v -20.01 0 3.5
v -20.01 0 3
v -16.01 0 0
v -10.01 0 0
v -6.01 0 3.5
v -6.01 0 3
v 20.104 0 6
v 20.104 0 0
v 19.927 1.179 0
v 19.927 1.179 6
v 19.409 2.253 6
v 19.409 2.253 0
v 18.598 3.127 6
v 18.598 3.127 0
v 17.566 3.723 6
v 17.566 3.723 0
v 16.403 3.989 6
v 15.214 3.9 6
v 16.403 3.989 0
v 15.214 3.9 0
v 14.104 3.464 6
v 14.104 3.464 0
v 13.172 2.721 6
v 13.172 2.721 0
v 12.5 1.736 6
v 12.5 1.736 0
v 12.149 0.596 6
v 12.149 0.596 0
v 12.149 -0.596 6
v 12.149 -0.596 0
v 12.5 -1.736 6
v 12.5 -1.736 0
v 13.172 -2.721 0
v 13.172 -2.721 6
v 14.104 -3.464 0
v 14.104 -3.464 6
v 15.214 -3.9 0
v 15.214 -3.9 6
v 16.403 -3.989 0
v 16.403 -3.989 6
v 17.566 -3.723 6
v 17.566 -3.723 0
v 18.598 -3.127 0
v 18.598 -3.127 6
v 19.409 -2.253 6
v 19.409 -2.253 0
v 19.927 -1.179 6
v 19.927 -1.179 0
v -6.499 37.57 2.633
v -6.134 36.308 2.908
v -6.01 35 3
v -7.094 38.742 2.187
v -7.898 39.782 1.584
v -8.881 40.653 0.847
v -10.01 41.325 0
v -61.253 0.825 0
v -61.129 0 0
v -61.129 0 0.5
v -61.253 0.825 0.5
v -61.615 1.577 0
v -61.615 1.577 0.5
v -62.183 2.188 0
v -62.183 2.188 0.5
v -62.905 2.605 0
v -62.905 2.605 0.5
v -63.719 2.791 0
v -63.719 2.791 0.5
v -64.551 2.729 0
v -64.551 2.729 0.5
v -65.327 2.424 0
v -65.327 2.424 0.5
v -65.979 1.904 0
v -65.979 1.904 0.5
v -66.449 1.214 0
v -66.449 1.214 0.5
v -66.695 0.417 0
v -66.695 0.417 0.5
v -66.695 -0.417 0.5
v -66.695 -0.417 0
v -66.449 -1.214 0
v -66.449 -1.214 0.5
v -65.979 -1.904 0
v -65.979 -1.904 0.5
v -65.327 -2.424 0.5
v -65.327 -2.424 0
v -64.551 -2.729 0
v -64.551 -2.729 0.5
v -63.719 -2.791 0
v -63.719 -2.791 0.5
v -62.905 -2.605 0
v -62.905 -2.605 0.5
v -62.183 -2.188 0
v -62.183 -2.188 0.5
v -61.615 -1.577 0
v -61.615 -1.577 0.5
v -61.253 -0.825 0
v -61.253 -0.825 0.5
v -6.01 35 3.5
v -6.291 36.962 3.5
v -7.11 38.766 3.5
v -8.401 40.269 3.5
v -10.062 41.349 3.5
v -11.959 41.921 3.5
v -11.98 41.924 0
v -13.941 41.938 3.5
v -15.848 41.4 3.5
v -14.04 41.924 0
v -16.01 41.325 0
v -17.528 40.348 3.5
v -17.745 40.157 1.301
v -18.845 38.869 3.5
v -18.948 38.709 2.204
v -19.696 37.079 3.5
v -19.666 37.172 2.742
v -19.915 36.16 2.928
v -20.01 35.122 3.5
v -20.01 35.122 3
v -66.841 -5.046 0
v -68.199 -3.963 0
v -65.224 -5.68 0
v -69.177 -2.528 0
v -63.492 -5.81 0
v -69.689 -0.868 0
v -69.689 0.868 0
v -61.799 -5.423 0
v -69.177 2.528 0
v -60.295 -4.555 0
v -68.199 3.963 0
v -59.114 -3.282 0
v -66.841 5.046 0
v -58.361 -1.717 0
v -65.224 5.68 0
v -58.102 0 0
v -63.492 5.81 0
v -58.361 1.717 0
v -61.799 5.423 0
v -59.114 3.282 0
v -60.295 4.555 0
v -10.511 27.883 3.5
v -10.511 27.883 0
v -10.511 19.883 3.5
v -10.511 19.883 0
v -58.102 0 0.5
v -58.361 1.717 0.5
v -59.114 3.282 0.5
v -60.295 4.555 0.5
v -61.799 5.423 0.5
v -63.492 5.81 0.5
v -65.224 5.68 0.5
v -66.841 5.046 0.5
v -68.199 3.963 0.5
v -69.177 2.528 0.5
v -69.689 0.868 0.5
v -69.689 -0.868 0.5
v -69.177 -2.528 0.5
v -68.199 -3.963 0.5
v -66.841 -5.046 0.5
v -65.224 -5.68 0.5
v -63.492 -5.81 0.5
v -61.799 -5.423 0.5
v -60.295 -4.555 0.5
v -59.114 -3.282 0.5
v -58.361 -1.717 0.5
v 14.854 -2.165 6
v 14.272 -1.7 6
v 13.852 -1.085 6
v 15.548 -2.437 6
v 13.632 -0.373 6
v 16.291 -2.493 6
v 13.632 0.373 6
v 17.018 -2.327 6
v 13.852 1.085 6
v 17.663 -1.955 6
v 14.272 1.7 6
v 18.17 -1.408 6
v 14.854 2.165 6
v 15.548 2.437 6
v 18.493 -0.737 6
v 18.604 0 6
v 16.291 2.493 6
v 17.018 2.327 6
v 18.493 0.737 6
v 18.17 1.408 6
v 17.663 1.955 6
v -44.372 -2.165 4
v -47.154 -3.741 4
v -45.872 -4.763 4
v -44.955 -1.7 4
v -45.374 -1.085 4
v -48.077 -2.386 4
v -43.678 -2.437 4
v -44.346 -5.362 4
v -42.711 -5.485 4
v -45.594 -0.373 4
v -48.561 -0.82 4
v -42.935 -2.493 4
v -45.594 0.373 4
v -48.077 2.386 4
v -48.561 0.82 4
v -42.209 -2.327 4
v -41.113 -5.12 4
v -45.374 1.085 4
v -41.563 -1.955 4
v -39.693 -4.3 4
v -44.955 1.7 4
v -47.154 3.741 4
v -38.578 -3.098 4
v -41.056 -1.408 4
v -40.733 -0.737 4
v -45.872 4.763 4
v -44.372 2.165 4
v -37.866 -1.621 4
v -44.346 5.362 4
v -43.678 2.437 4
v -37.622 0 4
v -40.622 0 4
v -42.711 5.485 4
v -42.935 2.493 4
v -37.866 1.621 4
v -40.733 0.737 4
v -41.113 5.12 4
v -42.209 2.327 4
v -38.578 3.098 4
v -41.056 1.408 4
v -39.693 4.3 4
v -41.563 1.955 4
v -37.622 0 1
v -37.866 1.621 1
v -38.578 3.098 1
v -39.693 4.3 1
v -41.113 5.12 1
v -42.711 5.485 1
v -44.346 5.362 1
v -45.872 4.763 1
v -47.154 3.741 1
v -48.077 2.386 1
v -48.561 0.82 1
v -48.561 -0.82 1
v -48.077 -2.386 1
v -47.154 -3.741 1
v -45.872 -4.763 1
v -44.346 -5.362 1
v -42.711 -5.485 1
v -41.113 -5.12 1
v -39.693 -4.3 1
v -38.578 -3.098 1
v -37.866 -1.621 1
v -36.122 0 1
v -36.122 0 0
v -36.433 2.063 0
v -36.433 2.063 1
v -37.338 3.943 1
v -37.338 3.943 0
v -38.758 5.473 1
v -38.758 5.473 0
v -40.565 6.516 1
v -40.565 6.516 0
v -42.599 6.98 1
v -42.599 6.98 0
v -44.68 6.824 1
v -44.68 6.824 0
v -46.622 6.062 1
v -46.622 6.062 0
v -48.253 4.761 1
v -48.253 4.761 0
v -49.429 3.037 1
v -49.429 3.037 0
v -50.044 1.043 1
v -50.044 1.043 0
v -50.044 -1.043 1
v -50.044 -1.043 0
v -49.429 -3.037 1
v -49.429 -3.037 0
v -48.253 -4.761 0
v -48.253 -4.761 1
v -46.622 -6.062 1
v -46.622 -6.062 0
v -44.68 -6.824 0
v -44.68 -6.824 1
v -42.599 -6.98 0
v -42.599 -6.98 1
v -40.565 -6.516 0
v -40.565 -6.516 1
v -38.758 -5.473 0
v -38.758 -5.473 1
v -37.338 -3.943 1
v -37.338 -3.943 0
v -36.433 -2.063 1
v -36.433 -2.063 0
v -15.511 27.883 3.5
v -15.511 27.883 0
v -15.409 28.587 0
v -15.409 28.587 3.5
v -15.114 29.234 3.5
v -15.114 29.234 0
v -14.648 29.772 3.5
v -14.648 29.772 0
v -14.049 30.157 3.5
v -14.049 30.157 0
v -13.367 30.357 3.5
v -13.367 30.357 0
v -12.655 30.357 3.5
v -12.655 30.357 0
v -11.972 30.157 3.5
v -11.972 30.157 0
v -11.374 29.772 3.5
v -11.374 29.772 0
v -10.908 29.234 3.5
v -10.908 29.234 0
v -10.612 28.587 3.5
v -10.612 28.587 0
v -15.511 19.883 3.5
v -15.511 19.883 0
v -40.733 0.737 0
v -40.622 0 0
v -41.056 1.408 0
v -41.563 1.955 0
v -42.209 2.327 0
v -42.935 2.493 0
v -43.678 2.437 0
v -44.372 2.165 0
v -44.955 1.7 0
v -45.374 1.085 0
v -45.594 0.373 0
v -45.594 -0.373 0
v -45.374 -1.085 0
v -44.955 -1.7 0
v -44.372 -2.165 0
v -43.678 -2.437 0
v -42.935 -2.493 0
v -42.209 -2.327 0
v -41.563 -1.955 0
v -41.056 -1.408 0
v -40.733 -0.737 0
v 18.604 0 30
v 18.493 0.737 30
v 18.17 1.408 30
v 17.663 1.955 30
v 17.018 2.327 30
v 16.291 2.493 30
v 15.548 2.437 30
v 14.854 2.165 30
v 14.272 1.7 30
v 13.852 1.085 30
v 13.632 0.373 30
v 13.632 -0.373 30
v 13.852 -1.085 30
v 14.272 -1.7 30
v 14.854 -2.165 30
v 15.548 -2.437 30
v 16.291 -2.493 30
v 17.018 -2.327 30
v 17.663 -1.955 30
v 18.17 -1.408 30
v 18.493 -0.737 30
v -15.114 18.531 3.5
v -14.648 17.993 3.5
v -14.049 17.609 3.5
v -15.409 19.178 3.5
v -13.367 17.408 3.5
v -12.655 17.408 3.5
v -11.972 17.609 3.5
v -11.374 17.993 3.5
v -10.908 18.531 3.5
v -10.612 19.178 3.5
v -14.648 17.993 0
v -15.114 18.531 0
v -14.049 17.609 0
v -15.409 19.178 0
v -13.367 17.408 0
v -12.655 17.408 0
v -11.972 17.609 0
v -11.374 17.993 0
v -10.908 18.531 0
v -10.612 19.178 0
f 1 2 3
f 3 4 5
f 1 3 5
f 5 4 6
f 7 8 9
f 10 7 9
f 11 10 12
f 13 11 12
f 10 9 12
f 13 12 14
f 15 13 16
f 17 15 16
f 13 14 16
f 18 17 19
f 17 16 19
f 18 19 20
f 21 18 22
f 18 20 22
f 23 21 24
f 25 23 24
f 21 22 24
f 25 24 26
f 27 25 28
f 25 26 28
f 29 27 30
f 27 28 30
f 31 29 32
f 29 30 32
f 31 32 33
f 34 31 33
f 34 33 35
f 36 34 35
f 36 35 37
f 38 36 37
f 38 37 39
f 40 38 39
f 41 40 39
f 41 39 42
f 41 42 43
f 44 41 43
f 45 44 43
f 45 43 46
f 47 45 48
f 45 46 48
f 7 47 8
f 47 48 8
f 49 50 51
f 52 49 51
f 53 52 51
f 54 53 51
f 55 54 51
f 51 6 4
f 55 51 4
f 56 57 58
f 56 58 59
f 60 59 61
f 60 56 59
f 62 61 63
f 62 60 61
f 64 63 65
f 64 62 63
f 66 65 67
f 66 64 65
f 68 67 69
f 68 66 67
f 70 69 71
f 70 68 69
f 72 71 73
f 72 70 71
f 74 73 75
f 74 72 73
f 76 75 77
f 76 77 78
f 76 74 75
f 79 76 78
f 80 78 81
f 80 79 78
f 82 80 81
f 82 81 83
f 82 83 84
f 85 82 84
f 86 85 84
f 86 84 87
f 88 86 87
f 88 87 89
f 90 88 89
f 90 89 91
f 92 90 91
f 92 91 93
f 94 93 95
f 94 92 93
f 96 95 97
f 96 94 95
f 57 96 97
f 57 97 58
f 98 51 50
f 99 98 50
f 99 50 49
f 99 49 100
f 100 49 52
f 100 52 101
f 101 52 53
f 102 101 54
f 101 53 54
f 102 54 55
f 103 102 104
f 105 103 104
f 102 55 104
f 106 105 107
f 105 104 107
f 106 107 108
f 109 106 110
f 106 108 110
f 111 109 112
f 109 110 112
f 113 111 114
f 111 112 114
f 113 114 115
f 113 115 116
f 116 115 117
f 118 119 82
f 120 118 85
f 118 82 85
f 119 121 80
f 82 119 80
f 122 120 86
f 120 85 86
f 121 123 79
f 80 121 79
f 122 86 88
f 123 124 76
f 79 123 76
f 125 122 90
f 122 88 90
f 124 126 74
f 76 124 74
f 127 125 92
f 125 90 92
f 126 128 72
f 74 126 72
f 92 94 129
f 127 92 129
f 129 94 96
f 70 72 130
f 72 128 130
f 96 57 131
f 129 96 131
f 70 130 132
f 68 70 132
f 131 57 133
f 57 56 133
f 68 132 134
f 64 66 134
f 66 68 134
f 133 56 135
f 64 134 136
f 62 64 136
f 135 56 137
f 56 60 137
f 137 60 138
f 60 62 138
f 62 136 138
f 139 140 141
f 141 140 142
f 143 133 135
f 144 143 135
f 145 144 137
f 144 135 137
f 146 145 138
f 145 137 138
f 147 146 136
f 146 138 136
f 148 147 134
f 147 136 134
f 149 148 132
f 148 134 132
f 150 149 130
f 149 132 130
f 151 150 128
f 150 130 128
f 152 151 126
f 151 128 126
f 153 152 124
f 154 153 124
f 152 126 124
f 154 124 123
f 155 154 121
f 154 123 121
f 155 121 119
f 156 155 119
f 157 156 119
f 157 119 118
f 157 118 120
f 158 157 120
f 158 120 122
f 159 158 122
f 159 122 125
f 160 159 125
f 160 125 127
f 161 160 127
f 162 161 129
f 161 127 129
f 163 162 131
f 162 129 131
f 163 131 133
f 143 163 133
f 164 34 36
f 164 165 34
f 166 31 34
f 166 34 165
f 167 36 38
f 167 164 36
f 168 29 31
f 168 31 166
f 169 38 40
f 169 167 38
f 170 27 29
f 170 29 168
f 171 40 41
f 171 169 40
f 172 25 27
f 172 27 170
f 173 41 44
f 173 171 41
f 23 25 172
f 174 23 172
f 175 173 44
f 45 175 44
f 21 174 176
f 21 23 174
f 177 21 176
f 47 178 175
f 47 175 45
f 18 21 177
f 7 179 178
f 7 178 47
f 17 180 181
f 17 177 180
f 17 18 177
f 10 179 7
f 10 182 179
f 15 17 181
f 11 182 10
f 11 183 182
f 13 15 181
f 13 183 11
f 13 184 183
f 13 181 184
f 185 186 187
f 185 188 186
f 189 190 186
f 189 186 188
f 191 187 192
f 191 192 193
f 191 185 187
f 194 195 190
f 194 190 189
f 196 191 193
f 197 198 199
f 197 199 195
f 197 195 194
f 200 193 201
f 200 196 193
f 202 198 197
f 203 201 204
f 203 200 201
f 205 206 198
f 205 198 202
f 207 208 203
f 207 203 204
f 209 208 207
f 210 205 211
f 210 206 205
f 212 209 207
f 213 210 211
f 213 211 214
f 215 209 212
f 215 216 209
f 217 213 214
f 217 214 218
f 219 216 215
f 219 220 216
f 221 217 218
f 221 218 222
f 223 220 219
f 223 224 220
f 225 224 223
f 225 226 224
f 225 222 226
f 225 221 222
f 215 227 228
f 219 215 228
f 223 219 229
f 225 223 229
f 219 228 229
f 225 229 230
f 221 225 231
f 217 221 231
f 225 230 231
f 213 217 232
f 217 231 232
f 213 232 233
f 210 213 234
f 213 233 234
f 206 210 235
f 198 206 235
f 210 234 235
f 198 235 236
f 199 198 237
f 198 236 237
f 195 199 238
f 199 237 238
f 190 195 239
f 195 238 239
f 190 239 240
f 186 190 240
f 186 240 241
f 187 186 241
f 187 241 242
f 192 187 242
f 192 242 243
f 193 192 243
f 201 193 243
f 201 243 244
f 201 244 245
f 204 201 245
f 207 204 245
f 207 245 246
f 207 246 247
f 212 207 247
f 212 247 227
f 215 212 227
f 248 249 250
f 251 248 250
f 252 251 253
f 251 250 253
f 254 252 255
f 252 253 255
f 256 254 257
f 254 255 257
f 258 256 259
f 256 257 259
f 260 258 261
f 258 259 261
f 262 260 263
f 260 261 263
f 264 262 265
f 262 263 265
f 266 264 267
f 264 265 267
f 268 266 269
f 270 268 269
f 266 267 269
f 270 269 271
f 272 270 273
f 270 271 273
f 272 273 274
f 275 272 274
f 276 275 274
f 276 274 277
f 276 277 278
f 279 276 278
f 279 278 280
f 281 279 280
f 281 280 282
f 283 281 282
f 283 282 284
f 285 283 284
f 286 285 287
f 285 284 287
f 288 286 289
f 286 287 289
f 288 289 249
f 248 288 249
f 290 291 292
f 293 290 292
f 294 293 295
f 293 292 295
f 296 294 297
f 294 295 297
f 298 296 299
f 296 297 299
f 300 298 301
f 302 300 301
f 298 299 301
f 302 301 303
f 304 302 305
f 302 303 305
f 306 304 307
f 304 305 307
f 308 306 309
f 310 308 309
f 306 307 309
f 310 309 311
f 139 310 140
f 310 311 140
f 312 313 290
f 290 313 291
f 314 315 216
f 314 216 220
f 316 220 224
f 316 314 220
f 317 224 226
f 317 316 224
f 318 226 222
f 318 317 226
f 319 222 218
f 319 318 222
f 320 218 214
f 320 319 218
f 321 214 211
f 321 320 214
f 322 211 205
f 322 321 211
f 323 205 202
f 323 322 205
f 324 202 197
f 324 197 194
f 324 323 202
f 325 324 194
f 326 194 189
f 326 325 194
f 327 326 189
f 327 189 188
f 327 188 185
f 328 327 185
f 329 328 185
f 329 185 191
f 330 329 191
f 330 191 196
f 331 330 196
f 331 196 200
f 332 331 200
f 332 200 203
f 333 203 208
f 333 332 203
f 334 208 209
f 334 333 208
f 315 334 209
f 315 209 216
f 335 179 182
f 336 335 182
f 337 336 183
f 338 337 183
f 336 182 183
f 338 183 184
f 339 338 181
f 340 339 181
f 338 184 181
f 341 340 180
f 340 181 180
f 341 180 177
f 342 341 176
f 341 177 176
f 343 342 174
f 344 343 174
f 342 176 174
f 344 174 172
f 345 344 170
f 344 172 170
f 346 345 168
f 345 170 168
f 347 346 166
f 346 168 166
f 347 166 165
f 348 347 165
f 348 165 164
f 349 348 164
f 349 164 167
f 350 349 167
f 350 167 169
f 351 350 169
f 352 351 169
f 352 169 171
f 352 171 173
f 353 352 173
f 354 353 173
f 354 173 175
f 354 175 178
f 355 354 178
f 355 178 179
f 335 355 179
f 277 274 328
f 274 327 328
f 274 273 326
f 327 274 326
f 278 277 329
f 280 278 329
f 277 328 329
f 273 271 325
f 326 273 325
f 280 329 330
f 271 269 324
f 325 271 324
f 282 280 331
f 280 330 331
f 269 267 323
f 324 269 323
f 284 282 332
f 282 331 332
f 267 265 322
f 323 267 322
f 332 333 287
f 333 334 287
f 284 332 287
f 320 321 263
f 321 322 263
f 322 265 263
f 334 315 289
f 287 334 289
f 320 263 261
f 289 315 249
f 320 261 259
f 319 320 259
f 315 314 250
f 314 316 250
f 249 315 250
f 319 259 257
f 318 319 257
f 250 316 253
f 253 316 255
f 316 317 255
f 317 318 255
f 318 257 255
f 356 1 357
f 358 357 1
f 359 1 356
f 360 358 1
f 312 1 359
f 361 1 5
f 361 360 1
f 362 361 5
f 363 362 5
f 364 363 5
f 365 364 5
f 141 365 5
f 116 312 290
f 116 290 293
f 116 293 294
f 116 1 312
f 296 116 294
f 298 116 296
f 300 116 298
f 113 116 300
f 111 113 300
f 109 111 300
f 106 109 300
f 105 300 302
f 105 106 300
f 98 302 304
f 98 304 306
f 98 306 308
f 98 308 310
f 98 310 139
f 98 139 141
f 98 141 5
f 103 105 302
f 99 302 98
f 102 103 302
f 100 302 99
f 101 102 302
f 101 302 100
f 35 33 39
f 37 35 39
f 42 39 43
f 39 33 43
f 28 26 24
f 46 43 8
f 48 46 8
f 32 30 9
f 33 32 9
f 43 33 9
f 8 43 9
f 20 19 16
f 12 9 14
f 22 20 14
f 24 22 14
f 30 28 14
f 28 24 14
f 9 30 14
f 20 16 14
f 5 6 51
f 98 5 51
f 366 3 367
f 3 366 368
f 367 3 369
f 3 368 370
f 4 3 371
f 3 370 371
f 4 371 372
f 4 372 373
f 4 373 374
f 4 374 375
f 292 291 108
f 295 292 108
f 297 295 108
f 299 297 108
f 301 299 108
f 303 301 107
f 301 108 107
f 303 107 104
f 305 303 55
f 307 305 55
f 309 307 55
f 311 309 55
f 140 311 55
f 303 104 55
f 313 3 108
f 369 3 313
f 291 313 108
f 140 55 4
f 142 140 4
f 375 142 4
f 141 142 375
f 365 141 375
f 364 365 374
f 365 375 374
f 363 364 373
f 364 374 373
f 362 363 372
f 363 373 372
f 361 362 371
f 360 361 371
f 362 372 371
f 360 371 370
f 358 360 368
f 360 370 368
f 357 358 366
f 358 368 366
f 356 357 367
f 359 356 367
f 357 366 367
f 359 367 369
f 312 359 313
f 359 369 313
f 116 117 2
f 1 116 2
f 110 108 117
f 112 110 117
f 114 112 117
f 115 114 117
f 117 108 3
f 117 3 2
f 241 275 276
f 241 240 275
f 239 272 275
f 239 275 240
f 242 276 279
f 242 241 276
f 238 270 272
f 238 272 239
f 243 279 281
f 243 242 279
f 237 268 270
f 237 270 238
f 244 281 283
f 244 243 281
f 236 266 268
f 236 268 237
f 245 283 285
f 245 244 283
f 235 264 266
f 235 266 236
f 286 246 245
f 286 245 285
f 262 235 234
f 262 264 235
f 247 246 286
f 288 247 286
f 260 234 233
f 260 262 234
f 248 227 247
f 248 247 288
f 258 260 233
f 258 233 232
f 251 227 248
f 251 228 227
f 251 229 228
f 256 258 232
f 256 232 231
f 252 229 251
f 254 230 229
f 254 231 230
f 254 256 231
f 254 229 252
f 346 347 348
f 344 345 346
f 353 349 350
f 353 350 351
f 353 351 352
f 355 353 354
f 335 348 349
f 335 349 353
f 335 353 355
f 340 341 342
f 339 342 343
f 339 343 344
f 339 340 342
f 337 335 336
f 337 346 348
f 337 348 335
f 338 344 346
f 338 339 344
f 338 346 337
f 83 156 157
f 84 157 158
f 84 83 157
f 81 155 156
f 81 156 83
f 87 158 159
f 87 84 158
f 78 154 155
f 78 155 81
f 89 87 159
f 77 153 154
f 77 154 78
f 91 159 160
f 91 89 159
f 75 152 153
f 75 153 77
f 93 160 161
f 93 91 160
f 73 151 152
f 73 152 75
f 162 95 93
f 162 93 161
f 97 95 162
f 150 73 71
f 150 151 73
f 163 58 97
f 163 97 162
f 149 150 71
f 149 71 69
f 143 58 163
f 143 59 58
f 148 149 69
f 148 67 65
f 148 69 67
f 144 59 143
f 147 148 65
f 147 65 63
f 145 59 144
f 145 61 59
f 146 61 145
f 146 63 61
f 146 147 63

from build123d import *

# Parameters (mm, degrees)
F1_DEPTH = 3.5
F3_DEPTH = 42.001534
F0_R     = 5.5
F0_R_2   = 2.5
F4_DEPTH = 4
F0_R_3   = 7
F5_DEPTH = 1
F0_R_4   = 5.826101
F0_R_5   = 2.79872
F6_DEPTH = 0.5
F7_DEPTH = 30
F0_R_6   = 4
F8_DEPTH = 6


with BuildPart() as f1:
    # F0 (on Top) → F1 (new body)
    with BuildSketch(Plane.XY):
        with BuildLine():
            Line((-20.010204, 35.122296), (-20.010204, 0))
            Line((-20.010204, 0), (-6.010204, 0))
            Line((-6.010204, 0), (-6.010204, 35))
            ThreePointArc((-6.010204, 35), (-12.949588, 42.000267), (-20.010204, 35.122296))
        make_face()
        with BuildLine():
            Line((-15.510738, 19.882787), (-15.510738, 27.882787))
            ThreePointArc((-15.510738, 27.882787), (-13.010738, 30.382787), (-10.510738, 27.882787))
            Line((-10.510738, 27.882787), (-10.510738, 19.882787))
            ThreePointArc((-10.510738, 19.882787), (-13.010738, 17.382787), (-15.510738, 19.882787))
        make_face(mode=Mode.SUBTRACT)
    extrude(amount=F1_DEPTH)

    # F2 (on face) → F3 (cut, through all)
    with BuildSketch(Plane.XZ):
        Polygon((-16.010204, 0), (-20.010204, 3), (-20.010204, 0), align=None)
        Polygon((-6.010204, 3), (-10.010204, 0), (-6.010204, 0), align=None)
    extrude(amount=-F3_DEPTH, mode=Mode.SUBTRACT)


with BuildPart() as f4:
    # F0 (on Top) → F4 (new body)
    with BuildSketch(Plane.XY):
        with Locations((-43.122021, 0)):
            Circle(F0_R)
        with Locations((-43.122021, 0)):
            Circle(F0_R_2, mode=Mode.SUBTRACT)
    extrude(amount=F4_DEPTH)

    # F0 (on Top) → F5 (join)
    with BuildSketch(Plane.XY):
        with Locations((-43.122021, 0)):
            Circle(F0_R_3)
        with Locations((-43.122021, 0)):
            Circle(F0_R, mode=Mode.SUBTRACT)
    extrude(amount=F5_DEPTH)


with BuildPart() as f6:
    # F0 (on Top) → F6 (new body)
    with BuildSketch(Plane.XY):
        with Locations((-63.927814, 0)):
            Circle(F0_R_4)
        with Locations((-63.927814, 0)):
            Circle(F0_R_5, mode=Mode.SUBTRACT)
    extrude(amount=F6_DEPTH)


with BuildPart() as f7:
    # F0 (on Top) → F7 (new body)
    with BuildSketch(Plane.XY):
        with Locations((16.104339, 0)):
            Circle(F0_R_2)
    extrude(amount=F7_DEPTH)

    # F0 (on Top) → F8 (join)
    with BuildSketch(Plane.XY):
        with Locations((16.104339, 0)):
            Circle(F0_R_6)
        with Locations((16.104339, 0)):
            Circle(F0_R_2, mode=Mode.SUBTRACT)
    extrude(amount=F8_DEPTH)


solid = Compound([f1.part, f4.part, f6.part, f7.part])
